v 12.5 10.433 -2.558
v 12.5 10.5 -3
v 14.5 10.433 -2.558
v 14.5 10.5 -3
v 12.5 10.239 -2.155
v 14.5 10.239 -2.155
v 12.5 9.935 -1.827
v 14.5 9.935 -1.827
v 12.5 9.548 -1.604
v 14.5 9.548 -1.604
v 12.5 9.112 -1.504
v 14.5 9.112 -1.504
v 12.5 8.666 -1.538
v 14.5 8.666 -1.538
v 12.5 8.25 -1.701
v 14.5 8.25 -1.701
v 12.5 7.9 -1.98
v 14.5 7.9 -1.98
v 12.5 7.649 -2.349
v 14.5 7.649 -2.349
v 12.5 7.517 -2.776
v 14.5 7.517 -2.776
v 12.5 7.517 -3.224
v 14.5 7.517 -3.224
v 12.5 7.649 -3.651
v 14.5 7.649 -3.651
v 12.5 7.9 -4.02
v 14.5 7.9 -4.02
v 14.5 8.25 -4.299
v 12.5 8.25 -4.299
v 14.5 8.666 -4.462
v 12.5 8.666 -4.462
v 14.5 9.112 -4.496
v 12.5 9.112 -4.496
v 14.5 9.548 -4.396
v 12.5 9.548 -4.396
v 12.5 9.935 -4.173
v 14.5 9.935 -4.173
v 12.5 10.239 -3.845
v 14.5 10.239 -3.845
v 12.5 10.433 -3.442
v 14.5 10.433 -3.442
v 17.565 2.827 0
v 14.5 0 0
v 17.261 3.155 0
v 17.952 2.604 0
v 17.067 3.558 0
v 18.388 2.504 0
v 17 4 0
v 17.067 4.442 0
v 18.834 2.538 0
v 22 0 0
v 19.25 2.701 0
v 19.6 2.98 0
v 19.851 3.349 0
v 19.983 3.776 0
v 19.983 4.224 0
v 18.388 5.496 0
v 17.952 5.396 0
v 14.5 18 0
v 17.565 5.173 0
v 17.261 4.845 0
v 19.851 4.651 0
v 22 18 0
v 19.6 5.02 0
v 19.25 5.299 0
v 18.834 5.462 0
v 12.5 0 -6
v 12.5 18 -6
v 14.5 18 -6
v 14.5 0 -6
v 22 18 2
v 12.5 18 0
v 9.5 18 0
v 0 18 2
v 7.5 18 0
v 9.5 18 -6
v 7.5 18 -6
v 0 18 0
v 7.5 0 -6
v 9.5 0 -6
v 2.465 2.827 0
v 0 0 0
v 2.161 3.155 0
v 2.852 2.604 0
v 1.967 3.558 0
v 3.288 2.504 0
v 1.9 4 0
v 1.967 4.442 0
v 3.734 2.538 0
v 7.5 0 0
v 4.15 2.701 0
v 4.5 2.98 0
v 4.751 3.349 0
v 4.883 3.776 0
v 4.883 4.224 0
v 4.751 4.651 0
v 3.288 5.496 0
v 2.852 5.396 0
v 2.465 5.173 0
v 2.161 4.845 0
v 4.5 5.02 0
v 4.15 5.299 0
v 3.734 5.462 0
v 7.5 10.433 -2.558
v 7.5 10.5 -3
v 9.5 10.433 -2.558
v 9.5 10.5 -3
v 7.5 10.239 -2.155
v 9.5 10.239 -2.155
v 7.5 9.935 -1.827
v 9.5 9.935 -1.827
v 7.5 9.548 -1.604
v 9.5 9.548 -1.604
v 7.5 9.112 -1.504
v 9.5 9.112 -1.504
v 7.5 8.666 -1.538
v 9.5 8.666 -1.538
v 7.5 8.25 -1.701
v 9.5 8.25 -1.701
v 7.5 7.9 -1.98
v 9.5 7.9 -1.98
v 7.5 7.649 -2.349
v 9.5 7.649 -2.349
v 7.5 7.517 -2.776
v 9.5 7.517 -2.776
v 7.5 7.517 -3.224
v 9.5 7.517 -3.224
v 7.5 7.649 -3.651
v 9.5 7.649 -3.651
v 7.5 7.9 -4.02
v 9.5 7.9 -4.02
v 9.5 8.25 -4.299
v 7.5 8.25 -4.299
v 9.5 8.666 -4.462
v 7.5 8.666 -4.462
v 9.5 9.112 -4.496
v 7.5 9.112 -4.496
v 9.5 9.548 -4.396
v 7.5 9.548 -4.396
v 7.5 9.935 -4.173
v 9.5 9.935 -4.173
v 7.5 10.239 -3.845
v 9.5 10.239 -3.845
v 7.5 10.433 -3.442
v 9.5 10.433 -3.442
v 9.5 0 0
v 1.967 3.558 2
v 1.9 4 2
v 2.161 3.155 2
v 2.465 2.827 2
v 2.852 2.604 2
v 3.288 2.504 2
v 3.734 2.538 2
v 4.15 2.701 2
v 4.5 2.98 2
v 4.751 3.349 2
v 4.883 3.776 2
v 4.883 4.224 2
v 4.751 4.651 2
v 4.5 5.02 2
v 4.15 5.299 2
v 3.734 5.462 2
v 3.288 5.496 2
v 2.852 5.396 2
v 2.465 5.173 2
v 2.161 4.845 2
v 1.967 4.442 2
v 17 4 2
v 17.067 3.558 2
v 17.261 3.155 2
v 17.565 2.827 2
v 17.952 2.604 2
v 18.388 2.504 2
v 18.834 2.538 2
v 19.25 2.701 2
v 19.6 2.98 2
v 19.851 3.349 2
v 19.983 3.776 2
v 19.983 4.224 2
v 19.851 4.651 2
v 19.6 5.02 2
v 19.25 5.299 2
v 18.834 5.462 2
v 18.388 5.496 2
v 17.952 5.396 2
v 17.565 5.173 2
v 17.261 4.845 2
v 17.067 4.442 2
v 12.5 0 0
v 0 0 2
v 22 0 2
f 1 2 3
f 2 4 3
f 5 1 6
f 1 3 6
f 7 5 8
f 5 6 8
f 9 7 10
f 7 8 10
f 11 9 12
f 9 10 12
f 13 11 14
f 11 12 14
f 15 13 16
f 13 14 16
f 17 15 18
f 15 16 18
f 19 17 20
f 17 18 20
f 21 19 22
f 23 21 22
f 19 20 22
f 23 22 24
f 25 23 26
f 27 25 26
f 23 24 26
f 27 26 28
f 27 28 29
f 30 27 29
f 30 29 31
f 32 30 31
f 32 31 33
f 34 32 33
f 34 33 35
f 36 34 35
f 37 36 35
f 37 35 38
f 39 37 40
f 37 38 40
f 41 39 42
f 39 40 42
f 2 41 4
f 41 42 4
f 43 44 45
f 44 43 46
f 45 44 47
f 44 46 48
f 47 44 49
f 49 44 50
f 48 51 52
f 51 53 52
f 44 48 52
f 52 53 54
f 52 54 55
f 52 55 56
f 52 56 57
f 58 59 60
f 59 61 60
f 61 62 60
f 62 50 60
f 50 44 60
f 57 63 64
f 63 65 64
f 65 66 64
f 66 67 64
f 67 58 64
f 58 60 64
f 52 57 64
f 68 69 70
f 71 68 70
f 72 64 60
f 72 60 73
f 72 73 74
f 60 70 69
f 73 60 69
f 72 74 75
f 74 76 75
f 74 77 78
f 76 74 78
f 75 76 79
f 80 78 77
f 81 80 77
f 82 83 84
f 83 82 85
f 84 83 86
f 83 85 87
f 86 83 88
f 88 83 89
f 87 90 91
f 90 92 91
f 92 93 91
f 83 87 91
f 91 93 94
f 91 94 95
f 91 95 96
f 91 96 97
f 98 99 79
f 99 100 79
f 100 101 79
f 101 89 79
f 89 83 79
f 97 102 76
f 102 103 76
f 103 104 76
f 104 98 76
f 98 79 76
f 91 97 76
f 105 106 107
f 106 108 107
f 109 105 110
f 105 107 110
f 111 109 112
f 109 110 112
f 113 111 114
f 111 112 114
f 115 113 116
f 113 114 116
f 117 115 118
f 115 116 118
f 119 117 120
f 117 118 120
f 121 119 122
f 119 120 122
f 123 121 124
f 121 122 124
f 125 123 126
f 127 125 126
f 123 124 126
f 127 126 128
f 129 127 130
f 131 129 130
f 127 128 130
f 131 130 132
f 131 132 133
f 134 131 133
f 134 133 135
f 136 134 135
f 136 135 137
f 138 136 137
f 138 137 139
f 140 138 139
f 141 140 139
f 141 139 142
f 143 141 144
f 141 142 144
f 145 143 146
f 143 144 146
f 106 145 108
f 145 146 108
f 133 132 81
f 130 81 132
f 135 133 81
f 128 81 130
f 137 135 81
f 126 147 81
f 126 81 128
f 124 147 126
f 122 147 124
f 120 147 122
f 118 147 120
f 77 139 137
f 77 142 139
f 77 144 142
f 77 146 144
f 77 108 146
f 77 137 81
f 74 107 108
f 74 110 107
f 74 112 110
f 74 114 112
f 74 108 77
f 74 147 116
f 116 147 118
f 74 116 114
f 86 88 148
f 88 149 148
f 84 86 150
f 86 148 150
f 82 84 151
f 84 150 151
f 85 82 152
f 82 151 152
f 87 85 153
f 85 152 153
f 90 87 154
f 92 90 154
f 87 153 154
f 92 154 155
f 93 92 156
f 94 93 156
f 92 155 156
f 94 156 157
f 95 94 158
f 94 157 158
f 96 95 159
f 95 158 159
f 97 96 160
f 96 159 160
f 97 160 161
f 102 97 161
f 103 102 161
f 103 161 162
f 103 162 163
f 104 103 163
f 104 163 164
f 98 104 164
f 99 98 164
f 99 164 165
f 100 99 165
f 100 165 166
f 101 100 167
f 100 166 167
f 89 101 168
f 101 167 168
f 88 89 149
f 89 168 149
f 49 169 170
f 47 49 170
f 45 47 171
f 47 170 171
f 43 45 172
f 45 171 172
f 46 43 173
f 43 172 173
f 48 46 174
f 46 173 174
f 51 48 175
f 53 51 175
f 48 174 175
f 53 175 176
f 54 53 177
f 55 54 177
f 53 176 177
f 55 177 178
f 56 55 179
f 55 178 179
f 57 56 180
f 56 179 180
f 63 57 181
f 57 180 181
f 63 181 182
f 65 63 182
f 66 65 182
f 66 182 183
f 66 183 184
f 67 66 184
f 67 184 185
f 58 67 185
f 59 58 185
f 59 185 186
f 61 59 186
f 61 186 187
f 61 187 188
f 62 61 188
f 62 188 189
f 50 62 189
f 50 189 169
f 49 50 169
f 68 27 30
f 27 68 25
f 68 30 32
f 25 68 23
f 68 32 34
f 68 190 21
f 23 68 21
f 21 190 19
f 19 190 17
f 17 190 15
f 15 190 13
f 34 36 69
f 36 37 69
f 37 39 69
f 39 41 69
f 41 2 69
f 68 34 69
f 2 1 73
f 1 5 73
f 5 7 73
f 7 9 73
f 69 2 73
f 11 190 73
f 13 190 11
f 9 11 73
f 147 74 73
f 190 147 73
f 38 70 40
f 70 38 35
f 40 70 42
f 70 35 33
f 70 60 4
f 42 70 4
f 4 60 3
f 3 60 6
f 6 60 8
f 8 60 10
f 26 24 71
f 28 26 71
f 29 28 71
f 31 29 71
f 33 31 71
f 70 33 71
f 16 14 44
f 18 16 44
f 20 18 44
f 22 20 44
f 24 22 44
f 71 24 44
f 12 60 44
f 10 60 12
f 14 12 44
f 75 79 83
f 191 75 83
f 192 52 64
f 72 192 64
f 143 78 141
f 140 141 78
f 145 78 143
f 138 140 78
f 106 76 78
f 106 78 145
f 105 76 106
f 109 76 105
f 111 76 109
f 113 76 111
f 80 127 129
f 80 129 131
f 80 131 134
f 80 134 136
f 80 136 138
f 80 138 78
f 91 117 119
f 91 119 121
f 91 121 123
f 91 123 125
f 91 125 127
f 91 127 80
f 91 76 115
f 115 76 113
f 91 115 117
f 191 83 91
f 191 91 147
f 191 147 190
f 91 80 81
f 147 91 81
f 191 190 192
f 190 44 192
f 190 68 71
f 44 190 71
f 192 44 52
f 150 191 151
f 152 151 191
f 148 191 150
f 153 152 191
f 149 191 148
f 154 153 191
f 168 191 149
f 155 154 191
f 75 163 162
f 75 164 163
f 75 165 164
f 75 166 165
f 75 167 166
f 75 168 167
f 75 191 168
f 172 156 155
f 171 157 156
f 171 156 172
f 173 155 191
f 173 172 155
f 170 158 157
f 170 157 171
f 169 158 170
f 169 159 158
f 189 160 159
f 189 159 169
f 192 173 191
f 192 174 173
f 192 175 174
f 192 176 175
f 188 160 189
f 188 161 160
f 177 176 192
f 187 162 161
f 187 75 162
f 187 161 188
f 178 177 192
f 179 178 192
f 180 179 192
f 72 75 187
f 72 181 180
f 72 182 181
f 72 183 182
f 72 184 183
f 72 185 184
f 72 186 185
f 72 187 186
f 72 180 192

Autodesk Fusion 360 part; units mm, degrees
sketch "Boceto1" plane through (0, 0, 0) normal (0, 0, 1) x (1, 0, 0)
  line L0 (0, 0) -> (22, 0)
  line L1 (22, 0) -> (22, 18)
  line L2 (22, 18) -> (0, 18)
  line L3 (0, 18) -> (0, 0)
  dimension "d3" = 22
  dimension "d4" = 18
extrude "Extruir1" add sketch "Boceto1" along normal blind 2
sketch "Boceto2" plane through (0, 0, 0) normal (0, 0, -1) x (1, 0, 0)
  line L0 (0, 0) -> (0, -18)
  line L1 (0, -18) -> (22, -18)
  line L2 (22, -18) -> (22, 0)
  line L3 (22, 0) -> (0, 0)
  line L4 (7.5, 0) -> (9.5, 0)
  line L5 (9.5, 0) -> (9.5, -18)
  line L6 (9.5, -18) -> (7.5, -18)
  line L7 (7.5, -18) -> (7.5, 0)
  line L8 (14.5, 0) -> (12.5, 0)
  line L9 (12.5, 0) -> (12.5, -18)
  line L10 (12.5, -18) -> (14.5, -18)
  line L11 (14.5, -18) -> (14.5, 0)
  dimension "d7" = 2
  dimension "d8" = 2
extrude "Extruir2" add sketch "Boceto2" along normal blind 6 contours L1 L3 L4 L5 L6 L7 | L1 L3 L8 L9 L10 L11
sketch "Boceto3" plane through (14.5, 0, 0) normal (1, 0, 0) x (0, 1, 0)
  line L0 (18, 0) -> (0, 0)
  line L1 (0, 0) -> (0, -6)
  line L2 (0, -6) -> (18, -6)
  line L3 (18, -6) -> (18, 0)
  circle A0 centre (9, -3) radius 1.5
  dimension "d11" = 3
extrude "Extruir3" cut sketch "Boceto3" against normal blind 7 contours A0
sketch "Boceto4" plane through (0, 0, 2) normal (0, 0, 1) x (-1, 0, 0)
  line L0 (0, -18) -> (0, 0)
  line L1 (0, 0) -> (-22, 0)
  line L2 (-22, 0) -> (-22, -18)
  line L3 (-22, -18) -> (0, -18)
  circle A0 centre (-3.4, -4) radius 1.5
  circle A1 centre (-18.5, -4) radius 1.5
  dimension "d14" = 3
  dimension "d15" = 3
extrude "Extruir4" cut sketch "Boceto4" against normal blind 2 contours A0 | A1
